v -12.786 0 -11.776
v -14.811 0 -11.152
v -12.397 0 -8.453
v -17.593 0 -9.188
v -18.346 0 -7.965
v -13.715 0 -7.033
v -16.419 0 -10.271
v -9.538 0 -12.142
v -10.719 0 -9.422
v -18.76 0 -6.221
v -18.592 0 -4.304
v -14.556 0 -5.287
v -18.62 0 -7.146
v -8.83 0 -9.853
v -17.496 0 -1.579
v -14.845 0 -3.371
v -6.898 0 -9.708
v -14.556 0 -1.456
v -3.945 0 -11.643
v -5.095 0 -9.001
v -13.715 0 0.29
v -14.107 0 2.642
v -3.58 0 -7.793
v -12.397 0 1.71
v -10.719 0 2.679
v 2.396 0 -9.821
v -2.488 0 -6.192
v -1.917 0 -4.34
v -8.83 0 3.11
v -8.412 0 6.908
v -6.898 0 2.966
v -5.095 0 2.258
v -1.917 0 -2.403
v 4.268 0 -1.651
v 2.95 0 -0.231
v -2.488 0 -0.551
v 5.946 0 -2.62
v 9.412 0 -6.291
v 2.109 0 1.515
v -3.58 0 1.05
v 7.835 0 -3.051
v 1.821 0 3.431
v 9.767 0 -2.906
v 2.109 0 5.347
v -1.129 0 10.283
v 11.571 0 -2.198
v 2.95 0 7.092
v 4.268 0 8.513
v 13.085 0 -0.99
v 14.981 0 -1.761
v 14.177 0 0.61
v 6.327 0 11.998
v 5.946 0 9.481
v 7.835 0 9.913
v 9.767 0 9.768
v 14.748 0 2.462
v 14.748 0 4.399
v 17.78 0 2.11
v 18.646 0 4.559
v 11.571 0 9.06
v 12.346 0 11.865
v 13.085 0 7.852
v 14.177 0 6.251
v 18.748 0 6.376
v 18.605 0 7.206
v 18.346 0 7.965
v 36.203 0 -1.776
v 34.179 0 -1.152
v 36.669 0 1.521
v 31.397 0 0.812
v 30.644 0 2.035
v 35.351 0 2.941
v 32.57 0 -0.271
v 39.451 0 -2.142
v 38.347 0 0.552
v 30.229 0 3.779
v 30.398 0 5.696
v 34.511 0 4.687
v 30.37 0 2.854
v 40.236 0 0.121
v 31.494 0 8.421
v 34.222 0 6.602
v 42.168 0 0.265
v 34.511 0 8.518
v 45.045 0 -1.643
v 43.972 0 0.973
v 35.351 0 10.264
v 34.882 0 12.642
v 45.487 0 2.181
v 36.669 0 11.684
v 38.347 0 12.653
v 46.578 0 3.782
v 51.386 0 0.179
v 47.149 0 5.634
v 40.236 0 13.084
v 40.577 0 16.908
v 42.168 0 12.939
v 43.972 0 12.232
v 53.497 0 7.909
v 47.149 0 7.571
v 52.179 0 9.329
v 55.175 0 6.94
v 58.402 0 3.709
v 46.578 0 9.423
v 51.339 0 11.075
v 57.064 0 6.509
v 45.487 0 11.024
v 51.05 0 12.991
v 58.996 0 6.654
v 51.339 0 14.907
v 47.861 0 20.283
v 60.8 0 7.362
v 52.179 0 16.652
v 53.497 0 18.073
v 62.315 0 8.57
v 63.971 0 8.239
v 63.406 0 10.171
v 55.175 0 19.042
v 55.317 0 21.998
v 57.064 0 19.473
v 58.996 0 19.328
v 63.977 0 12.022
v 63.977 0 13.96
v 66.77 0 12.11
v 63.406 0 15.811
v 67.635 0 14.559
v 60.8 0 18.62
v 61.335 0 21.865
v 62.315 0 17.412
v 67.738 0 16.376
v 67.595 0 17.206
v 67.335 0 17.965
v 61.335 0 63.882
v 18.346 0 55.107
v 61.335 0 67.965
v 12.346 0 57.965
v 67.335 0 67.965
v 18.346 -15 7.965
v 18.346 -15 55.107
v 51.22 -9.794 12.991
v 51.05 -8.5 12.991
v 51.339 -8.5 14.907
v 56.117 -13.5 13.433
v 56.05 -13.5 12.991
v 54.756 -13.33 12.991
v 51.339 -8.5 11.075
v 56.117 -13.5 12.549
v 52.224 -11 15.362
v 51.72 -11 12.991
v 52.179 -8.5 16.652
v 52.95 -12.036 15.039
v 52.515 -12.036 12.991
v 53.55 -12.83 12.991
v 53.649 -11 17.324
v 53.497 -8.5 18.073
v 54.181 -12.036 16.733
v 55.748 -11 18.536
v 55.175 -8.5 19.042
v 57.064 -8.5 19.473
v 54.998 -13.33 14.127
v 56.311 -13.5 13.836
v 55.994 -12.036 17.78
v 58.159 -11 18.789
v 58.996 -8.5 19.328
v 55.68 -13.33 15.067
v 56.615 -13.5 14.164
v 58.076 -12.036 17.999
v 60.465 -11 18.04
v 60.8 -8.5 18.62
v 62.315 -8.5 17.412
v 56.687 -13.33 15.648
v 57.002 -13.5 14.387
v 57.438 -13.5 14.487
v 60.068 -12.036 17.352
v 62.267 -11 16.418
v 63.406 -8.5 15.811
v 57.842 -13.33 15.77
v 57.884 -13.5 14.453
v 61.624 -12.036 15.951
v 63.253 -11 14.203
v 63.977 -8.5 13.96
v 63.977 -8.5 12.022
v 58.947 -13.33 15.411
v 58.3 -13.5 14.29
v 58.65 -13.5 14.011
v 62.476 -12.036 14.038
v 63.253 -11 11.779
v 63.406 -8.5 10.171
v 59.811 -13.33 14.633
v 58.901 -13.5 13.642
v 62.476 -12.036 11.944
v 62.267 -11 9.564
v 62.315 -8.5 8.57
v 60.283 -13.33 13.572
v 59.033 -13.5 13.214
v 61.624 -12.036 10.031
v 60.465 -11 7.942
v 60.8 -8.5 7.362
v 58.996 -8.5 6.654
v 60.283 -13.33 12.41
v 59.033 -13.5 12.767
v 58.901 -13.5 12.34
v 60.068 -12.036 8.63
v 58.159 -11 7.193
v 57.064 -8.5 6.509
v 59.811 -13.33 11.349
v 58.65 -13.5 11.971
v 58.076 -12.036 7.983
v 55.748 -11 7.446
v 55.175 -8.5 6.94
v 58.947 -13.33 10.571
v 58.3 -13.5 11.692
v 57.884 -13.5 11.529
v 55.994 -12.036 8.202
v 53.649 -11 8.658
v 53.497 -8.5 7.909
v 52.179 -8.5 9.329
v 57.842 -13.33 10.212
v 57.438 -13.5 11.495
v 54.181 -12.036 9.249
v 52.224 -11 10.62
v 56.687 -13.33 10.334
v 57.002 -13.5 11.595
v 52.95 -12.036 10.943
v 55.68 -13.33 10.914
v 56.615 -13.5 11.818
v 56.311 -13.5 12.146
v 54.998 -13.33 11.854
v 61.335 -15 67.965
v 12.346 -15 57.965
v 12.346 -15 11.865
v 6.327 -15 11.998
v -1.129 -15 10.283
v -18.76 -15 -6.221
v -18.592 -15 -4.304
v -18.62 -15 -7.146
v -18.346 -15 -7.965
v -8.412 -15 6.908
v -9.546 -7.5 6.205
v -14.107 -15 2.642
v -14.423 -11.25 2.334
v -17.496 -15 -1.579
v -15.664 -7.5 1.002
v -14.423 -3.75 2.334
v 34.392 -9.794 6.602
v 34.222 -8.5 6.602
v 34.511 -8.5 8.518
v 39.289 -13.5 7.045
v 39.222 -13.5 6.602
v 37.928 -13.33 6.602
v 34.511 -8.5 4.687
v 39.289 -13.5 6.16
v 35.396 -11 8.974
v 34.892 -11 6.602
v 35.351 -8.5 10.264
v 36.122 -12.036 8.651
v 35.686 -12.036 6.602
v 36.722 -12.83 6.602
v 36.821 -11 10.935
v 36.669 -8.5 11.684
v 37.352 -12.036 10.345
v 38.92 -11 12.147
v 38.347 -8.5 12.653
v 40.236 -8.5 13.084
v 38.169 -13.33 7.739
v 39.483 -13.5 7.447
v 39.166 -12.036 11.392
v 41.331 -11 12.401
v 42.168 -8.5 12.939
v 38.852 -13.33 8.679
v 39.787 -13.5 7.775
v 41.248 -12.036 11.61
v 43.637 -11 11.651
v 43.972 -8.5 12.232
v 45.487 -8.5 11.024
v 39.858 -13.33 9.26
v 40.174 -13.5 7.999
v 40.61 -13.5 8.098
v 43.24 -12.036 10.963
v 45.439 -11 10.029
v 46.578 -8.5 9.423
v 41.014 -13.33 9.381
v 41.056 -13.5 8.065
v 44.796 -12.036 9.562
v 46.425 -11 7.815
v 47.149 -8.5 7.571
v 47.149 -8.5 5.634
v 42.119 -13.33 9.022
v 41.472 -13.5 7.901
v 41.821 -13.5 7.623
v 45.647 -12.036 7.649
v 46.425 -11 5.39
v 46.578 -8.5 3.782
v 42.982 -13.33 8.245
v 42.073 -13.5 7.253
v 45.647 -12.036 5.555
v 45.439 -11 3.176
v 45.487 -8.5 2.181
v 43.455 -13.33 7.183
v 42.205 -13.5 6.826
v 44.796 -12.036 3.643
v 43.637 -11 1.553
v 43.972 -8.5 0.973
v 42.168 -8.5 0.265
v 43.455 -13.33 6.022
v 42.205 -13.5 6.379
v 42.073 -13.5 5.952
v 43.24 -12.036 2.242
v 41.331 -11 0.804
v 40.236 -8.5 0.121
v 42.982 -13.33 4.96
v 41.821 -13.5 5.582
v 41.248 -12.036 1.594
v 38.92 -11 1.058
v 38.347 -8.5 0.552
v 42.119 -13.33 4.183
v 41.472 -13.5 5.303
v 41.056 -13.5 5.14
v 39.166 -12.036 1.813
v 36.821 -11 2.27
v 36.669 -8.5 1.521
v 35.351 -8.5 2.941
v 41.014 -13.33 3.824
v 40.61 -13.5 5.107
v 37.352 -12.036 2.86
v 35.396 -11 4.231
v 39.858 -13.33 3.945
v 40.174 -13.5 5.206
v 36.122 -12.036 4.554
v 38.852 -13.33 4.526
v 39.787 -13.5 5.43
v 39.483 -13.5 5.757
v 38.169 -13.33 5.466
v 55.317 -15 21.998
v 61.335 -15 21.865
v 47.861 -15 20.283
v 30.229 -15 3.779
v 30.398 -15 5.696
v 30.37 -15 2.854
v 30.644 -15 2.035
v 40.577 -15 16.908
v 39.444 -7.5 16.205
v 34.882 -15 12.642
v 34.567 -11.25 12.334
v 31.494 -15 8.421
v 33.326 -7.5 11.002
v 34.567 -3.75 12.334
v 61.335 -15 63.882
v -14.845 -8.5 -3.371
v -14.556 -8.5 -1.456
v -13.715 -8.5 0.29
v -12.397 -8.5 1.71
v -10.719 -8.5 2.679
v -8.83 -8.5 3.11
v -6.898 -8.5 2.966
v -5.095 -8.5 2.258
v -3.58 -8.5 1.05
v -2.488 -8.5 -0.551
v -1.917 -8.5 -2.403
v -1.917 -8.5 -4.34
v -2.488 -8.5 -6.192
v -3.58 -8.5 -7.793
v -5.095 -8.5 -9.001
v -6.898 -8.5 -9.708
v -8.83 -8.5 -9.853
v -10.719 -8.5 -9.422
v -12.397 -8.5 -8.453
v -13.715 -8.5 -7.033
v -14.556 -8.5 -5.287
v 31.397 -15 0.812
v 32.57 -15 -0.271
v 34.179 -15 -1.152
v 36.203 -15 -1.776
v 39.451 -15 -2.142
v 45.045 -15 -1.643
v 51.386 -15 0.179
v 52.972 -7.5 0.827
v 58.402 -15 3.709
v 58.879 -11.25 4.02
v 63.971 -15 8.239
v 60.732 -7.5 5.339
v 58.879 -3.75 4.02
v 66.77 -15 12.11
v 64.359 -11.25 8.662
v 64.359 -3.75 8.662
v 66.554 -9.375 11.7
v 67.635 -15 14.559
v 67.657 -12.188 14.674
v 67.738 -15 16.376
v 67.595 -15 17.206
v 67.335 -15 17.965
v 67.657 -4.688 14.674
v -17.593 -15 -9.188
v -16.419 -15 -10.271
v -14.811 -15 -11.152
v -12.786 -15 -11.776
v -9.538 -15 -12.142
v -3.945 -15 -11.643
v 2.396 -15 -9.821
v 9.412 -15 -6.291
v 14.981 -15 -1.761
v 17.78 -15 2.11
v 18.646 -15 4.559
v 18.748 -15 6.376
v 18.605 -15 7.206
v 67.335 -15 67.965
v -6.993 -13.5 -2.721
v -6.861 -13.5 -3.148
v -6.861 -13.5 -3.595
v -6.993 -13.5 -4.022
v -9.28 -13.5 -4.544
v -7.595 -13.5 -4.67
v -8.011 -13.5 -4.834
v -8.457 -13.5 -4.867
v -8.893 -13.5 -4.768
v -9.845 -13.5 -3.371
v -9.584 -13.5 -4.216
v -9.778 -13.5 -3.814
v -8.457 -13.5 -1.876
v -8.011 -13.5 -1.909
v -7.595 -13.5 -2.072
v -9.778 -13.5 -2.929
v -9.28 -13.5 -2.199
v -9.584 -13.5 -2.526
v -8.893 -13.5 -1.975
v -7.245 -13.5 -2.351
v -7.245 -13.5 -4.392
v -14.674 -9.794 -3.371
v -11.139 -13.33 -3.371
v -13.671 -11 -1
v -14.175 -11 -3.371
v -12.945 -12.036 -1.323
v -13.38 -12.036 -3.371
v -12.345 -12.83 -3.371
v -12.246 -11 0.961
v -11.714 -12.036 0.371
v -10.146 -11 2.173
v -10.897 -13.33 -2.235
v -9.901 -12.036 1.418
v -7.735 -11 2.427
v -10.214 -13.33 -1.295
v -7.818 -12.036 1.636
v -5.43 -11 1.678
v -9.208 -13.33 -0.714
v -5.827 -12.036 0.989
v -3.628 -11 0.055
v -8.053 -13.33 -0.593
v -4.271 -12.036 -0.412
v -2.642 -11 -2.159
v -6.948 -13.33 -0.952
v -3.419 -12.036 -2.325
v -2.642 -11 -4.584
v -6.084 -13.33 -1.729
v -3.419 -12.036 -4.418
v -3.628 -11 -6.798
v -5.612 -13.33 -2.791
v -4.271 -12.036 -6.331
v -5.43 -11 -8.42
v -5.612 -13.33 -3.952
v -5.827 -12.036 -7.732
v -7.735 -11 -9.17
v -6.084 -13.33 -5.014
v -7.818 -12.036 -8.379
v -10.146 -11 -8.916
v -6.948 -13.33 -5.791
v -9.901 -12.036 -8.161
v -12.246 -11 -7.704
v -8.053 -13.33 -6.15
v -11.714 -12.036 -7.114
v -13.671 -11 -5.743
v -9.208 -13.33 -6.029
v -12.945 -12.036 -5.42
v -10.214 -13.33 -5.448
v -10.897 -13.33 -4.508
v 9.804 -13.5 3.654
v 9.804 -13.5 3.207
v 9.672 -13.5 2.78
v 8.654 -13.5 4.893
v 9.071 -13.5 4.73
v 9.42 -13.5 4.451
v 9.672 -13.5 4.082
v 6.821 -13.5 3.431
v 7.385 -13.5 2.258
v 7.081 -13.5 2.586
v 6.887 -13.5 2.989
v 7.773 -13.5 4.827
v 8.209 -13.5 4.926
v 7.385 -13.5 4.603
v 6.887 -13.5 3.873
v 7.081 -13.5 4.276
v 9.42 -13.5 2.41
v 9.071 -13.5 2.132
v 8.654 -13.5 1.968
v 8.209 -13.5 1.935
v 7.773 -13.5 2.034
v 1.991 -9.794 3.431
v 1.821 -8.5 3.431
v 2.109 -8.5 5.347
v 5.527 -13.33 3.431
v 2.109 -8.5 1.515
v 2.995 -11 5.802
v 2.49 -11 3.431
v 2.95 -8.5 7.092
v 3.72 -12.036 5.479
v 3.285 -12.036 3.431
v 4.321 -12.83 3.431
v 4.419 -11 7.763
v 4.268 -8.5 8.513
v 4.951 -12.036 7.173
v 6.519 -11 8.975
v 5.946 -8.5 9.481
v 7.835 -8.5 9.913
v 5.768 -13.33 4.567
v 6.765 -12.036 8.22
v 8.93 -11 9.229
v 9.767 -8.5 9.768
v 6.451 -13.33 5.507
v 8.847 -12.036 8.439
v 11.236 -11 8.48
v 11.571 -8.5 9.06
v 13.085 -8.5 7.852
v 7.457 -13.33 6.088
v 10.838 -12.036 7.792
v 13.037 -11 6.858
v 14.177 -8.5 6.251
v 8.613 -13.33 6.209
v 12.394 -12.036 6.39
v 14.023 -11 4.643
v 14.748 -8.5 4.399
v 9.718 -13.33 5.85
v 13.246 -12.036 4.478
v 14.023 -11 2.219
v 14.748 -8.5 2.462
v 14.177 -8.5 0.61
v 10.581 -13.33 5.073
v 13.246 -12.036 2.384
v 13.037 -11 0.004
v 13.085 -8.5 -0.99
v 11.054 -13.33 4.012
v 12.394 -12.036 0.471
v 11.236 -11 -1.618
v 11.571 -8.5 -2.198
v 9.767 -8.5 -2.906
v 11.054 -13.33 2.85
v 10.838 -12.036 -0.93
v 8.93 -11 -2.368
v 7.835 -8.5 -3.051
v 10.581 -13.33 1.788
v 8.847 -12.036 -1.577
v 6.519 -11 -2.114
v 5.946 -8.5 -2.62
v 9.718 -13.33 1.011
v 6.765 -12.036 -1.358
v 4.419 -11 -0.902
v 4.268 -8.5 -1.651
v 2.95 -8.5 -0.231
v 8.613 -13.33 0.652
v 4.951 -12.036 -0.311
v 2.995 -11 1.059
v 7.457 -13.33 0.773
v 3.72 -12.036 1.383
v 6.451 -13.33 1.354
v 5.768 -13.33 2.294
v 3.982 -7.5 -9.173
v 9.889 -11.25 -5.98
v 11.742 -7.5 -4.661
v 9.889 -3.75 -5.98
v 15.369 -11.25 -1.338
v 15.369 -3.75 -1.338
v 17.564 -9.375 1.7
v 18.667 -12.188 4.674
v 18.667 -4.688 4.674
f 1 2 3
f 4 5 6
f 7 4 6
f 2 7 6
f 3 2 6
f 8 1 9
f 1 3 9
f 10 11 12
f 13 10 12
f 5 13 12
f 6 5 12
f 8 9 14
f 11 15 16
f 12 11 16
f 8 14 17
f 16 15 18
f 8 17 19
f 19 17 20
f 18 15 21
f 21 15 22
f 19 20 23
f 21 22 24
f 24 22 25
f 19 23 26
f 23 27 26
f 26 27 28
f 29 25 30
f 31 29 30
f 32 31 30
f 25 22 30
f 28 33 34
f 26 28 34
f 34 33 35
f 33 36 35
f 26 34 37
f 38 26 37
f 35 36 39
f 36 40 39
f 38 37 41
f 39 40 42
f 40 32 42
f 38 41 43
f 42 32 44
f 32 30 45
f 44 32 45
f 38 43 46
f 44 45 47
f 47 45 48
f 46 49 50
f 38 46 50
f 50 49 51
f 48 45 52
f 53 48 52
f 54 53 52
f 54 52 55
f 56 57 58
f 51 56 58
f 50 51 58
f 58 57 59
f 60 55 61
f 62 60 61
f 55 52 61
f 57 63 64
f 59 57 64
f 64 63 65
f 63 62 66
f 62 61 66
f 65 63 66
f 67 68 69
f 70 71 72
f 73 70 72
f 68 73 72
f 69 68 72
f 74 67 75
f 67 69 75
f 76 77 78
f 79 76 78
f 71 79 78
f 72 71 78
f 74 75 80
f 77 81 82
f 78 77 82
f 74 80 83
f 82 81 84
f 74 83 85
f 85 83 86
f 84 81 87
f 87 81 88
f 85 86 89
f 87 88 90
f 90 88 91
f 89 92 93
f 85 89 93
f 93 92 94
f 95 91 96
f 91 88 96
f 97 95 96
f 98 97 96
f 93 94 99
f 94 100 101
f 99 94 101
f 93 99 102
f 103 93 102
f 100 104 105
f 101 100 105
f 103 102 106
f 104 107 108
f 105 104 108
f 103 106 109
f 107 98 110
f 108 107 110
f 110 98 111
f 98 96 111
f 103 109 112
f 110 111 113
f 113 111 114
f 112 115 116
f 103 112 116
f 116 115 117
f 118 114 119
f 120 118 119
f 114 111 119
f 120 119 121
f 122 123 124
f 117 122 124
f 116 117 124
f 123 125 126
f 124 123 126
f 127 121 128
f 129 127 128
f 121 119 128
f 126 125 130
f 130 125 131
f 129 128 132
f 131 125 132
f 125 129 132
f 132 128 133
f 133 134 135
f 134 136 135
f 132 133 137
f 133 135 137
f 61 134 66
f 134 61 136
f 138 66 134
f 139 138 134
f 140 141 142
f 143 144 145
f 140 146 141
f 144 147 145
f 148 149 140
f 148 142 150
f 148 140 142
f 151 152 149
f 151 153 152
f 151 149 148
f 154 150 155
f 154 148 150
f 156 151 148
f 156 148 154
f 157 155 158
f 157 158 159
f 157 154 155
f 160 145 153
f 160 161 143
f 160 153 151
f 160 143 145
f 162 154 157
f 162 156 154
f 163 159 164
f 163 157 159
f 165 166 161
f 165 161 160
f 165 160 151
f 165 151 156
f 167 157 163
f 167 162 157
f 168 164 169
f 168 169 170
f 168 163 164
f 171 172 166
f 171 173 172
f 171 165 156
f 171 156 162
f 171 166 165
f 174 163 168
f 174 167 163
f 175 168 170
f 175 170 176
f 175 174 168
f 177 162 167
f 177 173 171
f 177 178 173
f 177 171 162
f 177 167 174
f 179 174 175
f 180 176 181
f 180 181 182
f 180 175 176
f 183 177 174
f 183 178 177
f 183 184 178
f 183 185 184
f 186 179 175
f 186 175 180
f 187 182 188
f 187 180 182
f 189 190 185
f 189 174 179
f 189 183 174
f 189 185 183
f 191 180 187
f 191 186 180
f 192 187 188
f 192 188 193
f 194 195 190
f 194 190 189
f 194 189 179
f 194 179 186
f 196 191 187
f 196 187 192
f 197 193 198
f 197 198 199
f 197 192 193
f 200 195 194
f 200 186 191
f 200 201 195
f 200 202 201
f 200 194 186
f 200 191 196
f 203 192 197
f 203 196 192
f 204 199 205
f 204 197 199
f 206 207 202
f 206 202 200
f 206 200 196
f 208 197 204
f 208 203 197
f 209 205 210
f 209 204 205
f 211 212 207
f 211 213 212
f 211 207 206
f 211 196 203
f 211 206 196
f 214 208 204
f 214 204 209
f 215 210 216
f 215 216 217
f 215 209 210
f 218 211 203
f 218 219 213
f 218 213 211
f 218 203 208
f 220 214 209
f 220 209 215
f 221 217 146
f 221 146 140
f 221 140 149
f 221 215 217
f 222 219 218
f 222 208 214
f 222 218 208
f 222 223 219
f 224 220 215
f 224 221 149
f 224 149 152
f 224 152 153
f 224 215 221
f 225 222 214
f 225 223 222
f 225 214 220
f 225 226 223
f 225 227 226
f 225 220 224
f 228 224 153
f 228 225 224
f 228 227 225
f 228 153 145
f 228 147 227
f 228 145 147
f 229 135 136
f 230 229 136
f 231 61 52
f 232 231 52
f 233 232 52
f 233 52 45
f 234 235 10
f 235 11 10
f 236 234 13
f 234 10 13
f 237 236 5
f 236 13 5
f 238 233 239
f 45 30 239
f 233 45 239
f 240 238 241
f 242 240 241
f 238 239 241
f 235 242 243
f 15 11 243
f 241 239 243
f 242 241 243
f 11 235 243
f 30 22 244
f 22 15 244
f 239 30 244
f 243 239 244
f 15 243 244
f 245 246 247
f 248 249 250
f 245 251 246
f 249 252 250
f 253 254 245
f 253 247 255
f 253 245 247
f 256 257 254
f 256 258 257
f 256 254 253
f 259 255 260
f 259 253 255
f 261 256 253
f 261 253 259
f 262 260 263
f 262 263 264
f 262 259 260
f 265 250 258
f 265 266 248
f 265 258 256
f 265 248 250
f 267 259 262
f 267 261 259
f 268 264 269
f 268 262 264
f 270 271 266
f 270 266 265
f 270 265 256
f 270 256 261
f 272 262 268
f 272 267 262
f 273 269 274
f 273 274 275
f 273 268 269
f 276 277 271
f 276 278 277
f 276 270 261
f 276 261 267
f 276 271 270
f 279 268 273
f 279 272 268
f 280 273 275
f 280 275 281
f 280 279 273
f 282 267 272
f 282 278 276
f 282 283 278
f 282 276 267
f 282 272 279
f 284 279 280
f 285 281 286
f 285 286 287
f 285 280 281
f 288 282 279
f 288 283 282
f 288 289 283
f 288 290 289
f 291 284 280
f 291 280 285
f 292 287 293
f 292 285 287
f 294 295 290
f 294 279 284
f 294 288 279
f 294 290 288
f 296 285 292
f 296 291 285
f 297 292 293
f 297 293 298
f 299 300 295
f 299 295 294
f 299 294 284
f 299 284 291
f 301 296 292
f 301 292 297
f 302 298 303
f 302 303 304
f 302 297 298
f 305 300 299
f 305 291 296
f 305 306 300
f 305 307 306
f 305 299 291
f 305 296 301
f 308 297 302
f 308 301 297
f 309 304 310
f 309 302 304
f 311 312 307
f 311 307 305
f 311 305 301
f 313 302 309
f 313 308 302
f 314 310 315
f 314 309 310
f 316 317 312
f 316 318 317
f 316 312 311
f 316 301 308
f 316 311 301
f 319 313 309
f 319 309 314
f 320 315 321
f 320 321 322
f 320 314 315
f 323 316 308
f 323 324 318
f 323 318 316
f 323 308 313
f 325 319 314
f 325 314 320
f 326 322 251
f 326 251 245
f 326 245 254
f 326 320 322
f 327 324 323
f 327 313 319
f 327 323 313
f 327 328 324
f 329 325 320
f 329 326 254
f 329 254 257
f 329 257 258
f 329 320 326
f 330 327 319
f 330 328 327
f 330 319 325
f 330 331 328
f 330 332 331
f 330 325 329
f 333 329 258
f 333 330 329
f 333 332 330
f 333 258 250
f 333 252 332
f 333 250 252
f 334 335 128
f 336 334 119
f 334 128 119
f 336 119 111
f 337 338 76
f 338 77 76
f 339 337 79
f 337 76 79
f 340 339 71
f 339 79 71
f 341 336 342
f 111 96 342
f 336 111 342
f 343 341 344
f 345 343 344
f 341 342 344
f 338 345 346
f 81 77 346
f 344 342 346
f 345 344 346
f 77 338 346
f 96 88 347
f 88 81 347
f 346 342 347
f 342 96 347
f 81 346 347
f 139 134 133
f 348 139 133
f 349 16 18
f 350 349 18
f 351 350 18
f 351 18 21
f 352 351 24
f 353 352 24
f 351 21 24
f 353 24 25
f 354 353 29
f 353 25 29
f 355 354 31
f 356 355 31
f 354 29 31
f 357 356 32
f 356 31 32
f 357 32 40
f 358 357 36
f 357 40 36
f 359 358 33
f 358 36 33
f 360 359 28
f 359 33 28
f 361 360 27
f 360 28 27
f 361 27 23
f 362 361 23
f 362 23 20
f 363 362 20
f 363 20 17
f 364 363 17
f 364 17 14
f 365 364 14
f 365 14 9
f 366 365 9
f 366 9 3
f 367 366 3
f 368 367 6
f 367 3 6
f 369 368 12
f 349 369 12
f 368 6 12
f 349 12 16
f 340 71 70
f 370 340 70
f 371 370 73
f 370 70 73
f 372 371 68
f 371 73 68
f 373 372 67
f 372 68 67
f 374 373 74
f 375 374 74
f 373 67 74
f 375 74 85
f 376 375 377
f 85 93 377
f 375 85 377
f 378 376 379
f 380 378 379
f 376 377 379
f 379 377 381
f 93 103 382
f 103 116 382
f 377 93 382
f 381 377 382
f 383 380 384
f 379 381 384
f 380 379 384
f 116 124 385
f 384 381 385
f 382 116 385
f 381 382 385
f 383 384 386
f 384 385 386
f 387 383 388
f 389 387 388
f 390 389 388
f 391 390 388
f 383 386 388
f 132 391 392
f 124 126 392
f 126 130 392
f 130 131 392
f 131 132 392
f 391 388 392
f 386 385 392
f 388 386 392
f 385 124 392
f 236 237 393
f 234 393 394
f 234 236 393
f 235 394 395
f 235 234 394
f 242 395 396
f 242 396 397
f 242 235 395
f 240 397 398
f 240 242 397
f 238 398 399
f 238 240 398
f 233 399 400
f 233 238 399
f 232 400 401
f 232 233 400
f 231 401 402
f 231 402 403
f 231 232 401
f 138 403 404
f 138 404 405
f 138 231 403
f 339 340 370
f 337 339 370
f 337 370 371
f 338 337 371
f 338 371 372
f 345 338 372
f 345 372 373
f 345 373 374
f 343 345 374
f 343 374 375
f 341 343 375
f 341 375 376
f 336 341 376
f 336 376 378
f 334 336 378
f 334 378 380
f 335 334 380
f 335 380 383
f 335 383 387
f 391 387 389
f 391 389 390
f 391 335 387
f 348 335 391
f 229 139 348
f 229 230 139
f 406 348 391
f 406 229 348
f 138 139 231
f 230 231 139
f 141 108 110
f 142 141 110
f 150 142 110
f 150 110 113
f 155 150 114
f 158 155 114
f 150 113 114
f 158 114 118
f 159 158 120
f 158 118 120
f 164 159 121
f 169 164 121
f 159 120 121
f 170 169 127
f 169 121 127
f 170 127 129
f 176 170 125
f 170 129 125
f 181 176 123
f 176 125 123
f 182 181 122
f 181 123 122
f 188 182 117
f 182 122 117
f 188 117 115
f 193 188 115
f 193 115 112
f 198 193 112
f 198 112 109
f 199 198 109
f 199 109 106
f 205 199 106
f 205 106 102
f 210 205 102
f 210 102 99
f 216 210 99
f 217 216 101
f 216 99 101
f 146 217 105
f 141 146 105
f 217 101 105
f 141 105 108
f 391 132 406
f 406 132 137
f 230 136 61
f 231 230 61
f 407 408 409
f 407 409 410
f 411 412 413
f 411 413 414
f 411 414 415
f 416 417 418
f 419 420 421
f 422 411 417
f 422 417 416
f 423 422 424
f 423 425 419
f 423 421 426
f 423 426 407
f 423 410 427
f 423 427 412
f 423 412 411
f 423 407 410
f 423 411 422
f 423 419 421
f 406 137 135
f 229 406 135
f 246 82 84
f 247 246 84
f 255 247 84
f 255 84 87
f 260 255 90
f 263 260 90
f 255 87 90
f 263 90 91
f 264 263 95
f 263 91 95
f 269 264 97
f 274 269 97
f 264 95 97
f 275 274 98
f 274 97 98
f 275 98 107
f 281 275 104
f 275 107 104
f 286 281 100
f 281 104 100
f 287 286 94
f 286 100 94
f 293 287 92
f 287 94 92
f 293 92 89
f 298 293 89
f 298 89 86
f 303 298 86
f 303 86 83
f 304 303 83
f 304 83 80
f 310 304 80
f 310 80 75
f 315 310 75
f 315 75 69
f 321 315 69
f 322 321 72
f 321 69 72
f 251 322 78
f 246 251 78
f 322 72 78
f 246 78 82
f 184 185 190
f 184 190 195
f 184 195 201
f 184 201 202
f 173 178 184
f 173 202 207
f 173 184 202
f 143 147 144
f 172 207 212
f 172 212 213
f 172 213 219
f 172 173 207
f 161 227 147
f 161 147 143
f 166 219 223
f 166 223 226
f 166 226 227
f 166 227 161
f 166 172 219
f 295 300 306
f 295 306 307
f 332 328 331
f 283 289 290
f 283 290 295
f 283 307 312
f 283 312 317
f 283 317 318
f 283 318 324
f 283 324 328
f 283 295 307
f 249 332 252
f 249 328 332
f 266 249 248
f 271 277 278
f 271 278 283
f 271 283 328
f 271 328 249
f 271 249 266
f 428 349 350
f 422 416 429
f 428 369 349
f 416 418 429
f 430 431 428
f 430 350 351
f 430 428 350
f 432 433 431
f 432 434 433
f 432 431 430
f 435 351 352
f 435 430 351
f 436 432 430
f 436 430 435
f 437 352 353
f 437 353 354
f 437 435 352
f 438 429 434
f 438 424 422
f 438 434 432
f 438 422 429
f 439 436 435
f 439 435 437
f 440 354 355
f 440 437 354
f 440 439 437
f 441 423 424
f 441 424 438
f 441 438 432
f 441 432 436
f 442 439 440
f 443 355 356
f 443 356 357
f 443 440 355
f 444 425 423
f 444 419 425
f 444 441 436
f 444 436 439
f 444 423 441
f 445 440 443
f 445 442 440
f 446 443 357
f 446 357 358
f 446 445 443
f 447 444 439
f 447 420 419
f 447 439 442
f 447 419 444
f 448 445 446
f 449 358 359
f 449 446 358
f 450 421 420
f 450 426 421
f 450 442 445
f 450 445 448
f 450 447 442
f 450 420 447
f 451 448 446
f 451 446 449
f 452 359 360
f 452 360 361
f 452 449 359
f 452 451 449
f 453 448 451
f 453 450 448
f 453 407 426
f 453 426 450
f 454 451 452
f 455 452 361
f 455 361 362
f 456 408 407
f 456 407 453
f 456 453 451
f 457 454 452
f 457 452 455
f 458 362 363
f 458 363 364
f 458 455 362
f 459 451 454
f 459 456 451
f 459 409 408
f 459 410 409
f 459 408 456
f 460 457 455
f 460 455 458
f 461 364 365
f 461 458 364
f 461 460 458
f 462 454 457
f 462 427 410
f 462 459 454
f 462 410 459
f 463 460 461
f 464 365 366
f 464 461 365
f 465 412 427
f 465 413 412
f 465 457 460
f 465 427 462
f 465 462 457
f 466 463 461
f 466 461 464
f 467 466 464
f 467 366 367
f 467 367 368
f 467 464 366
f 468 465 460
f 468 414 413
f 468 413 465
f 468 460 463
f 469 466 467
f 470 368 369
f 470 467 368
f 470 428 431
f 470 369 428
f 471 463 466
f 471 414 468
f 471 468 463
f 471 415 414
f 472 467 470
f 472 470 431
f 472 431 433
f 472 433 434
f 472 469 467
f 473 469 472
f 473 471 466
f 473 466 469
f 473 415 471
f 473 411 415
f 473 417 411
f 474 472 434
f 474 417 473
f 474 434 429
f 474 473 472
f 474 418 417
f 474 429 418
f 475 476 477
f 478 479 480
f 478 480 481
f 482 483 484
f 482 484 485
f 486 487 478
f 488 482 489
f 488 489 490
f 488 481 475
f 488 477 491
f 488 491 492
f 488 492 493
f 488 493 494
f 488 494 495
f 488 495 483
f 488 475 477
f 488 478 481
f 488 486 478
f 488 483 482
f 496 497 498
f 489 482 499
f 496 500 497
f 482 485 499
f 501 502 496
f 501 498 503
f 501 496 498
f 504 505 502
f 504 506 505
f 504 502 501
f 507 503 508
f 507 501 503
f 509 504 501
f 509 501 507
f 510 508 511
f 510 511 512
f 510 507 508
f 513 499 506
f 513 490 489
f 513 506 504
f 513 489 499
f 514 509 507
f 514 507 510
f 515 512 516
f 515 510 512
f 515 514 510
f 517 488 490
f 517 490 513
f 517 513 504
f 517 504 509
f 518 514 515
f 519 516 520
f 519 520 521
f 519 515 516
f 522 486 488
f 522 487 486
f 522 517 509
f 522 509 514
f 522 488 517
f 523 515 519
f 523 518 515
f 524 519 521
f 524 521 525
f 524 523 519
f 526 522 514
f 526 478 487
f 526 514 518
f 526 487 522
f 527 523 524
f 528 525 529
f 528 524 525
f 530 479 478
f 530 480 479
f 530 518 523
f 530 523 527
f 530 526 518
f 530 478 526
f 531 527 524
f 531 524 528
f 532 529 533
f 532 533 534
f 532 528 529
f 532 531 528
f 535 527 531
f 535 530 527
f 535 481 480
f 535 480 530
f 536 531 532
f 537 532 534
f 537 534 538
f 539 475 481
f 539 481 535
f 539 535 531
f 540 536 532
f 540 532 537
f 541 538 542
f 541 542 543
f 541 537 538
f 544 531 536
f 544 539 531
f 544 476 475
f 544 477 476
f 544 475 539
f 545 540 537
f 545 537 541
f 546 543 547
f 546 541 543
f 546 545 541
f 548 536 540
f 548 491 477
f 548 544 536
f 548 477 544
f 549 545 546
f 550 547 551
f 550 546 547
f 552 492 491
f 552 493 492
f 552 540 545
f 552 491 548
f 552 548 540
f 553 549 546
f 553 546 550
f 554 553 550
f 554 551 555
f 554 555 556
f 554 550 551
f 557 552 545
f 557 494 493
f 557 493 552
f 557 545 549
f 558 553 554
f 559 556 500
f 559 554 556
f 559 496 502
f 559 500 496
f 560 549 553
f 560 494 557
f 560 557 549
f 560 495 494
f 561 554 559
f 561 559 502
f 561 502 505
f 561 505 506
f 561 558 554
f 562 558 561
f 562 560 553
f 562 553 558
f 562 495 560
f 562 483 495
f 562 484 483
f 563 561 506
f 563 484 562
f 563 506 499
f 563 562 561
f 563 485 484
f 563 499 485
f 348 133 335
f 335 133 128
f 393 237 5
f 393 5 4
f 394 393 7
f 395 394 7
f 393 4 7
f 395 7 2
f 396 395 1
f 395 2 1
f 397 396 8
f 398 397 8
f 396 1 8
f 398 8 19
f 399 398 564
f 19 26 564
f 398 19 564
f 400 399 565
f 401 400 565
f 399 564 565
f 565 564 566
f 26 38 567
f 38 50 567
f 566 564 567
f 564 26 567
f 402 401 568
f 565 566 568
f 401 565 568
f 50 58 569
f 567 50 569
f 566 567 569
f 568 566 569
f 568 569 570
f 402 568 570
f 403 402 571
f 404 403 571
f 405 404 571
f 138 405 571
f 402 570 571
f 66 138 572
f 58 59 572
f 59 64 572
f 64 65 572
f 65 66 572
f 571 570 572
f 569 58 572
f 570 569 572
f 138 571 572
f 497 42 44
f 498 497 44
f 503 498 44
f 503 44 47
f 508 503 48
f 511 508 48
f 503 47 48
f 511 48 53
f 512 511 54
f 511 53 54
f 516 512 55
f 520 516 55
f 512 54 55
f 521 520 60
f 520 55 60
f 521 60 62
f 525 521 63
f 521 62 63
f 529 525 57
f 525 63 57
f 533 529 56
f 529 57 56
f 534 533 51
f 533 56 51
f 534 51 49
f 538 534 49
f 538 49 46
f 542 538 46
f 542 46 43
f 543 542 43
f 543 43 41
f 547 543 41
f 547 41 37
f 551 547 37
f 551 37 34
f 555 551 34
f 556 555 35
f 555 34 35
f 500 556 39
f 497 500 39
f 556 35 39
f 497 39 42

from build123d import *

# Parameters (mm, degrees)
F1_DEPTH = 15
F2_R     = 6.5
F3_DEPTH = 13.5
F4_R     = 5


with BuildPart() as f1:
    # F0 (on Front) → F1 (new body)
    with BuildSketch(Plane.XZ):
        with BuildLine():
            add(Edge.make_bspline(
                [(12.345655, 11.864802), (-30.375552, 19.744474), (-18.345655, -7.96473)],
                knots=[3.780961, 3.780961, 3.780961, 6.283185, 6.283185, 6.283185], degree=2, weights=[1, 0.314267, 1]))
            add(Edge.make_bspline(
                [(-18.345655, -7.96473), (-14.36329, -17.137558), (3.982365, -9.172828), (22.328021, -1.208097), (18.345655, 7.96473)],
                knots=[0, 0, 0, 1.570796, 1.570796, 3.141593, 3.141593, 3.141593], degree=2, weights=[1, 0.707107, 1, 0.707107, 1]))
            Line((18.345655, 7.96473), (12.345655, 7.96473))
            Line((12.345655, 7.96473), (12.345655, 11.864802))
        make_face()
        with BuildLine():
            Line((12.345655, 7.96473), (18.345655, 7.96473))
            add(Edge.make_bspline(
                [(18.345655, 7.96473), (17.027337, 11.001294), (12.345655, 11.864802)],
                knots=[3.141593, 3.141593, 3.141593, 3.780961, 3.780961, 3.780961], degree=2, weights=[1, 0.949335, 1]))
            Line((12.345655, 11.864802), (12.345655, 7.96473))
        make_face()
        with BuildLine():
            add(Edge.make_bspline(
                [(18.345655, 7.96473), (17.027337, 11.001294), (12.345655, 11.864802)],
                knots=[3.141593, 3.141593, 3.141593, 3.780961, 3.780961, 3.780961], degree=2, weights=[1, 0.949335, 1]))
            Line((18.345655, 7.96473), (18.345655, 55.106992))
            Line((18.345655, 55.106992), (18.345655, 57.96473))
            Line((18.345655, 57.96473), (12.345655, 57.96473))
            Line((12.345655, 57.96473), (12.345655, 11.864802))
        make_face()
        Polygon((18.345655, 57.96473), (18.345655, 55.106992), (61.33545, 63.882247), (61.33545, 67.96473), (12.345655, 57.96473), align=None)
        with BuildLine():
            Line((61.33545, 67.96473), (61.33545, 63.882247))
            Line((61.33545, 63.882247), (61.33545, 21.864802))
            add(Edge.make_bspline(
                [(67.33545, 17.96473), (66.017132, 21.001294), (61.33545, 21.864802)],
                knots=[3.141593, 3.141593, 3.141593, 3.780961, 3.780961, 3.780961], degree=2, weights=[1, 0.949335, 1]))
            Line((67.33545, 17.96473), (67.33545, 67.96473))
            Line((67.33545, 67.96473), (61.33545, 67.96473))
        make_face()
        with BuildLine():
            add(Edge.make_bspline(
                [(67.33545, 17.96473), (66.017132, 21.001294), (61.33545, 21.864802)],
                knots=[3.141593, 3.141593, 3.141593, 3.780961, 3.780961, 3.780961], degree=2, weights=[1, 0.949335, 1]))
            Line((61.33545, 21.864802), (61.33545, 17.96473))
            Line((61.33545, 17.96473), (67.33545, 17.96473))
        make_face()
        with BuildLine():
            Line((61.33545, 17.96473), (61.33545, 21.864802))
            add(Edge.make_bspline(
                [(61.33545, 21.864802), (18.614243, 29.744474), (30.64414, 2.03527)],
                knots=[3.780961, 3.780961, 3.780961, 6.283185, 6.283185, 6.283185], degree=2, weights=[1, 0.314267, 1]))
            add(Edge.make_bspline(
                [(30.64414, 2.03527), (34.626505, -7.137558), (52.97216, 0.827172), (71.317815, 8.791903), (67.33545, 17.96473)],
                knots=[0, 0, 0, 1.570796, 1.570796, 3.141593, 3.141593, 3.141593], degree=2, weights=[1, 0.707107, 1, 0.707107, 1]))
            Line((67.33545, 17.96473), (61.33545, 17.96473))
        make_face()
    extrude(amount=F1_DEPTH)

    # F2 (on face) → F3 (cut)
    with BuildSketch(Plane(origin=(0, 0, 0), x_dir=(-1, 0, 0), z_dir=(0, 1, 0))):
        with Locations((-57.550041, 12.990905)):
            Circle(F2_R)
        with Locations((-40.721868, 6.602434)):
            Circle(F2_R)
        with Locations((-8.320603, 3.430686)):
            Circle(F2_R)
        with Locations((8.344655, -3.371459)):
            Circle(F2_R)
    extrude(amount=-F3_DEPTH, mode=Mode.SUBTRACT)

    # F4
    f4_edges = [f1.edges().sort_by_distance(p)[0] for p in [
        (47.221868, -13.5, 6.602434),
        (64.050041, -13.5, 12.990905),
        (14.820603, -13.5, 3.430686),
        (-1.844655, -13.5, -3.371459),
    ]]
    fillet(f4_edges, radius=F4_R)


solid = f1.part
